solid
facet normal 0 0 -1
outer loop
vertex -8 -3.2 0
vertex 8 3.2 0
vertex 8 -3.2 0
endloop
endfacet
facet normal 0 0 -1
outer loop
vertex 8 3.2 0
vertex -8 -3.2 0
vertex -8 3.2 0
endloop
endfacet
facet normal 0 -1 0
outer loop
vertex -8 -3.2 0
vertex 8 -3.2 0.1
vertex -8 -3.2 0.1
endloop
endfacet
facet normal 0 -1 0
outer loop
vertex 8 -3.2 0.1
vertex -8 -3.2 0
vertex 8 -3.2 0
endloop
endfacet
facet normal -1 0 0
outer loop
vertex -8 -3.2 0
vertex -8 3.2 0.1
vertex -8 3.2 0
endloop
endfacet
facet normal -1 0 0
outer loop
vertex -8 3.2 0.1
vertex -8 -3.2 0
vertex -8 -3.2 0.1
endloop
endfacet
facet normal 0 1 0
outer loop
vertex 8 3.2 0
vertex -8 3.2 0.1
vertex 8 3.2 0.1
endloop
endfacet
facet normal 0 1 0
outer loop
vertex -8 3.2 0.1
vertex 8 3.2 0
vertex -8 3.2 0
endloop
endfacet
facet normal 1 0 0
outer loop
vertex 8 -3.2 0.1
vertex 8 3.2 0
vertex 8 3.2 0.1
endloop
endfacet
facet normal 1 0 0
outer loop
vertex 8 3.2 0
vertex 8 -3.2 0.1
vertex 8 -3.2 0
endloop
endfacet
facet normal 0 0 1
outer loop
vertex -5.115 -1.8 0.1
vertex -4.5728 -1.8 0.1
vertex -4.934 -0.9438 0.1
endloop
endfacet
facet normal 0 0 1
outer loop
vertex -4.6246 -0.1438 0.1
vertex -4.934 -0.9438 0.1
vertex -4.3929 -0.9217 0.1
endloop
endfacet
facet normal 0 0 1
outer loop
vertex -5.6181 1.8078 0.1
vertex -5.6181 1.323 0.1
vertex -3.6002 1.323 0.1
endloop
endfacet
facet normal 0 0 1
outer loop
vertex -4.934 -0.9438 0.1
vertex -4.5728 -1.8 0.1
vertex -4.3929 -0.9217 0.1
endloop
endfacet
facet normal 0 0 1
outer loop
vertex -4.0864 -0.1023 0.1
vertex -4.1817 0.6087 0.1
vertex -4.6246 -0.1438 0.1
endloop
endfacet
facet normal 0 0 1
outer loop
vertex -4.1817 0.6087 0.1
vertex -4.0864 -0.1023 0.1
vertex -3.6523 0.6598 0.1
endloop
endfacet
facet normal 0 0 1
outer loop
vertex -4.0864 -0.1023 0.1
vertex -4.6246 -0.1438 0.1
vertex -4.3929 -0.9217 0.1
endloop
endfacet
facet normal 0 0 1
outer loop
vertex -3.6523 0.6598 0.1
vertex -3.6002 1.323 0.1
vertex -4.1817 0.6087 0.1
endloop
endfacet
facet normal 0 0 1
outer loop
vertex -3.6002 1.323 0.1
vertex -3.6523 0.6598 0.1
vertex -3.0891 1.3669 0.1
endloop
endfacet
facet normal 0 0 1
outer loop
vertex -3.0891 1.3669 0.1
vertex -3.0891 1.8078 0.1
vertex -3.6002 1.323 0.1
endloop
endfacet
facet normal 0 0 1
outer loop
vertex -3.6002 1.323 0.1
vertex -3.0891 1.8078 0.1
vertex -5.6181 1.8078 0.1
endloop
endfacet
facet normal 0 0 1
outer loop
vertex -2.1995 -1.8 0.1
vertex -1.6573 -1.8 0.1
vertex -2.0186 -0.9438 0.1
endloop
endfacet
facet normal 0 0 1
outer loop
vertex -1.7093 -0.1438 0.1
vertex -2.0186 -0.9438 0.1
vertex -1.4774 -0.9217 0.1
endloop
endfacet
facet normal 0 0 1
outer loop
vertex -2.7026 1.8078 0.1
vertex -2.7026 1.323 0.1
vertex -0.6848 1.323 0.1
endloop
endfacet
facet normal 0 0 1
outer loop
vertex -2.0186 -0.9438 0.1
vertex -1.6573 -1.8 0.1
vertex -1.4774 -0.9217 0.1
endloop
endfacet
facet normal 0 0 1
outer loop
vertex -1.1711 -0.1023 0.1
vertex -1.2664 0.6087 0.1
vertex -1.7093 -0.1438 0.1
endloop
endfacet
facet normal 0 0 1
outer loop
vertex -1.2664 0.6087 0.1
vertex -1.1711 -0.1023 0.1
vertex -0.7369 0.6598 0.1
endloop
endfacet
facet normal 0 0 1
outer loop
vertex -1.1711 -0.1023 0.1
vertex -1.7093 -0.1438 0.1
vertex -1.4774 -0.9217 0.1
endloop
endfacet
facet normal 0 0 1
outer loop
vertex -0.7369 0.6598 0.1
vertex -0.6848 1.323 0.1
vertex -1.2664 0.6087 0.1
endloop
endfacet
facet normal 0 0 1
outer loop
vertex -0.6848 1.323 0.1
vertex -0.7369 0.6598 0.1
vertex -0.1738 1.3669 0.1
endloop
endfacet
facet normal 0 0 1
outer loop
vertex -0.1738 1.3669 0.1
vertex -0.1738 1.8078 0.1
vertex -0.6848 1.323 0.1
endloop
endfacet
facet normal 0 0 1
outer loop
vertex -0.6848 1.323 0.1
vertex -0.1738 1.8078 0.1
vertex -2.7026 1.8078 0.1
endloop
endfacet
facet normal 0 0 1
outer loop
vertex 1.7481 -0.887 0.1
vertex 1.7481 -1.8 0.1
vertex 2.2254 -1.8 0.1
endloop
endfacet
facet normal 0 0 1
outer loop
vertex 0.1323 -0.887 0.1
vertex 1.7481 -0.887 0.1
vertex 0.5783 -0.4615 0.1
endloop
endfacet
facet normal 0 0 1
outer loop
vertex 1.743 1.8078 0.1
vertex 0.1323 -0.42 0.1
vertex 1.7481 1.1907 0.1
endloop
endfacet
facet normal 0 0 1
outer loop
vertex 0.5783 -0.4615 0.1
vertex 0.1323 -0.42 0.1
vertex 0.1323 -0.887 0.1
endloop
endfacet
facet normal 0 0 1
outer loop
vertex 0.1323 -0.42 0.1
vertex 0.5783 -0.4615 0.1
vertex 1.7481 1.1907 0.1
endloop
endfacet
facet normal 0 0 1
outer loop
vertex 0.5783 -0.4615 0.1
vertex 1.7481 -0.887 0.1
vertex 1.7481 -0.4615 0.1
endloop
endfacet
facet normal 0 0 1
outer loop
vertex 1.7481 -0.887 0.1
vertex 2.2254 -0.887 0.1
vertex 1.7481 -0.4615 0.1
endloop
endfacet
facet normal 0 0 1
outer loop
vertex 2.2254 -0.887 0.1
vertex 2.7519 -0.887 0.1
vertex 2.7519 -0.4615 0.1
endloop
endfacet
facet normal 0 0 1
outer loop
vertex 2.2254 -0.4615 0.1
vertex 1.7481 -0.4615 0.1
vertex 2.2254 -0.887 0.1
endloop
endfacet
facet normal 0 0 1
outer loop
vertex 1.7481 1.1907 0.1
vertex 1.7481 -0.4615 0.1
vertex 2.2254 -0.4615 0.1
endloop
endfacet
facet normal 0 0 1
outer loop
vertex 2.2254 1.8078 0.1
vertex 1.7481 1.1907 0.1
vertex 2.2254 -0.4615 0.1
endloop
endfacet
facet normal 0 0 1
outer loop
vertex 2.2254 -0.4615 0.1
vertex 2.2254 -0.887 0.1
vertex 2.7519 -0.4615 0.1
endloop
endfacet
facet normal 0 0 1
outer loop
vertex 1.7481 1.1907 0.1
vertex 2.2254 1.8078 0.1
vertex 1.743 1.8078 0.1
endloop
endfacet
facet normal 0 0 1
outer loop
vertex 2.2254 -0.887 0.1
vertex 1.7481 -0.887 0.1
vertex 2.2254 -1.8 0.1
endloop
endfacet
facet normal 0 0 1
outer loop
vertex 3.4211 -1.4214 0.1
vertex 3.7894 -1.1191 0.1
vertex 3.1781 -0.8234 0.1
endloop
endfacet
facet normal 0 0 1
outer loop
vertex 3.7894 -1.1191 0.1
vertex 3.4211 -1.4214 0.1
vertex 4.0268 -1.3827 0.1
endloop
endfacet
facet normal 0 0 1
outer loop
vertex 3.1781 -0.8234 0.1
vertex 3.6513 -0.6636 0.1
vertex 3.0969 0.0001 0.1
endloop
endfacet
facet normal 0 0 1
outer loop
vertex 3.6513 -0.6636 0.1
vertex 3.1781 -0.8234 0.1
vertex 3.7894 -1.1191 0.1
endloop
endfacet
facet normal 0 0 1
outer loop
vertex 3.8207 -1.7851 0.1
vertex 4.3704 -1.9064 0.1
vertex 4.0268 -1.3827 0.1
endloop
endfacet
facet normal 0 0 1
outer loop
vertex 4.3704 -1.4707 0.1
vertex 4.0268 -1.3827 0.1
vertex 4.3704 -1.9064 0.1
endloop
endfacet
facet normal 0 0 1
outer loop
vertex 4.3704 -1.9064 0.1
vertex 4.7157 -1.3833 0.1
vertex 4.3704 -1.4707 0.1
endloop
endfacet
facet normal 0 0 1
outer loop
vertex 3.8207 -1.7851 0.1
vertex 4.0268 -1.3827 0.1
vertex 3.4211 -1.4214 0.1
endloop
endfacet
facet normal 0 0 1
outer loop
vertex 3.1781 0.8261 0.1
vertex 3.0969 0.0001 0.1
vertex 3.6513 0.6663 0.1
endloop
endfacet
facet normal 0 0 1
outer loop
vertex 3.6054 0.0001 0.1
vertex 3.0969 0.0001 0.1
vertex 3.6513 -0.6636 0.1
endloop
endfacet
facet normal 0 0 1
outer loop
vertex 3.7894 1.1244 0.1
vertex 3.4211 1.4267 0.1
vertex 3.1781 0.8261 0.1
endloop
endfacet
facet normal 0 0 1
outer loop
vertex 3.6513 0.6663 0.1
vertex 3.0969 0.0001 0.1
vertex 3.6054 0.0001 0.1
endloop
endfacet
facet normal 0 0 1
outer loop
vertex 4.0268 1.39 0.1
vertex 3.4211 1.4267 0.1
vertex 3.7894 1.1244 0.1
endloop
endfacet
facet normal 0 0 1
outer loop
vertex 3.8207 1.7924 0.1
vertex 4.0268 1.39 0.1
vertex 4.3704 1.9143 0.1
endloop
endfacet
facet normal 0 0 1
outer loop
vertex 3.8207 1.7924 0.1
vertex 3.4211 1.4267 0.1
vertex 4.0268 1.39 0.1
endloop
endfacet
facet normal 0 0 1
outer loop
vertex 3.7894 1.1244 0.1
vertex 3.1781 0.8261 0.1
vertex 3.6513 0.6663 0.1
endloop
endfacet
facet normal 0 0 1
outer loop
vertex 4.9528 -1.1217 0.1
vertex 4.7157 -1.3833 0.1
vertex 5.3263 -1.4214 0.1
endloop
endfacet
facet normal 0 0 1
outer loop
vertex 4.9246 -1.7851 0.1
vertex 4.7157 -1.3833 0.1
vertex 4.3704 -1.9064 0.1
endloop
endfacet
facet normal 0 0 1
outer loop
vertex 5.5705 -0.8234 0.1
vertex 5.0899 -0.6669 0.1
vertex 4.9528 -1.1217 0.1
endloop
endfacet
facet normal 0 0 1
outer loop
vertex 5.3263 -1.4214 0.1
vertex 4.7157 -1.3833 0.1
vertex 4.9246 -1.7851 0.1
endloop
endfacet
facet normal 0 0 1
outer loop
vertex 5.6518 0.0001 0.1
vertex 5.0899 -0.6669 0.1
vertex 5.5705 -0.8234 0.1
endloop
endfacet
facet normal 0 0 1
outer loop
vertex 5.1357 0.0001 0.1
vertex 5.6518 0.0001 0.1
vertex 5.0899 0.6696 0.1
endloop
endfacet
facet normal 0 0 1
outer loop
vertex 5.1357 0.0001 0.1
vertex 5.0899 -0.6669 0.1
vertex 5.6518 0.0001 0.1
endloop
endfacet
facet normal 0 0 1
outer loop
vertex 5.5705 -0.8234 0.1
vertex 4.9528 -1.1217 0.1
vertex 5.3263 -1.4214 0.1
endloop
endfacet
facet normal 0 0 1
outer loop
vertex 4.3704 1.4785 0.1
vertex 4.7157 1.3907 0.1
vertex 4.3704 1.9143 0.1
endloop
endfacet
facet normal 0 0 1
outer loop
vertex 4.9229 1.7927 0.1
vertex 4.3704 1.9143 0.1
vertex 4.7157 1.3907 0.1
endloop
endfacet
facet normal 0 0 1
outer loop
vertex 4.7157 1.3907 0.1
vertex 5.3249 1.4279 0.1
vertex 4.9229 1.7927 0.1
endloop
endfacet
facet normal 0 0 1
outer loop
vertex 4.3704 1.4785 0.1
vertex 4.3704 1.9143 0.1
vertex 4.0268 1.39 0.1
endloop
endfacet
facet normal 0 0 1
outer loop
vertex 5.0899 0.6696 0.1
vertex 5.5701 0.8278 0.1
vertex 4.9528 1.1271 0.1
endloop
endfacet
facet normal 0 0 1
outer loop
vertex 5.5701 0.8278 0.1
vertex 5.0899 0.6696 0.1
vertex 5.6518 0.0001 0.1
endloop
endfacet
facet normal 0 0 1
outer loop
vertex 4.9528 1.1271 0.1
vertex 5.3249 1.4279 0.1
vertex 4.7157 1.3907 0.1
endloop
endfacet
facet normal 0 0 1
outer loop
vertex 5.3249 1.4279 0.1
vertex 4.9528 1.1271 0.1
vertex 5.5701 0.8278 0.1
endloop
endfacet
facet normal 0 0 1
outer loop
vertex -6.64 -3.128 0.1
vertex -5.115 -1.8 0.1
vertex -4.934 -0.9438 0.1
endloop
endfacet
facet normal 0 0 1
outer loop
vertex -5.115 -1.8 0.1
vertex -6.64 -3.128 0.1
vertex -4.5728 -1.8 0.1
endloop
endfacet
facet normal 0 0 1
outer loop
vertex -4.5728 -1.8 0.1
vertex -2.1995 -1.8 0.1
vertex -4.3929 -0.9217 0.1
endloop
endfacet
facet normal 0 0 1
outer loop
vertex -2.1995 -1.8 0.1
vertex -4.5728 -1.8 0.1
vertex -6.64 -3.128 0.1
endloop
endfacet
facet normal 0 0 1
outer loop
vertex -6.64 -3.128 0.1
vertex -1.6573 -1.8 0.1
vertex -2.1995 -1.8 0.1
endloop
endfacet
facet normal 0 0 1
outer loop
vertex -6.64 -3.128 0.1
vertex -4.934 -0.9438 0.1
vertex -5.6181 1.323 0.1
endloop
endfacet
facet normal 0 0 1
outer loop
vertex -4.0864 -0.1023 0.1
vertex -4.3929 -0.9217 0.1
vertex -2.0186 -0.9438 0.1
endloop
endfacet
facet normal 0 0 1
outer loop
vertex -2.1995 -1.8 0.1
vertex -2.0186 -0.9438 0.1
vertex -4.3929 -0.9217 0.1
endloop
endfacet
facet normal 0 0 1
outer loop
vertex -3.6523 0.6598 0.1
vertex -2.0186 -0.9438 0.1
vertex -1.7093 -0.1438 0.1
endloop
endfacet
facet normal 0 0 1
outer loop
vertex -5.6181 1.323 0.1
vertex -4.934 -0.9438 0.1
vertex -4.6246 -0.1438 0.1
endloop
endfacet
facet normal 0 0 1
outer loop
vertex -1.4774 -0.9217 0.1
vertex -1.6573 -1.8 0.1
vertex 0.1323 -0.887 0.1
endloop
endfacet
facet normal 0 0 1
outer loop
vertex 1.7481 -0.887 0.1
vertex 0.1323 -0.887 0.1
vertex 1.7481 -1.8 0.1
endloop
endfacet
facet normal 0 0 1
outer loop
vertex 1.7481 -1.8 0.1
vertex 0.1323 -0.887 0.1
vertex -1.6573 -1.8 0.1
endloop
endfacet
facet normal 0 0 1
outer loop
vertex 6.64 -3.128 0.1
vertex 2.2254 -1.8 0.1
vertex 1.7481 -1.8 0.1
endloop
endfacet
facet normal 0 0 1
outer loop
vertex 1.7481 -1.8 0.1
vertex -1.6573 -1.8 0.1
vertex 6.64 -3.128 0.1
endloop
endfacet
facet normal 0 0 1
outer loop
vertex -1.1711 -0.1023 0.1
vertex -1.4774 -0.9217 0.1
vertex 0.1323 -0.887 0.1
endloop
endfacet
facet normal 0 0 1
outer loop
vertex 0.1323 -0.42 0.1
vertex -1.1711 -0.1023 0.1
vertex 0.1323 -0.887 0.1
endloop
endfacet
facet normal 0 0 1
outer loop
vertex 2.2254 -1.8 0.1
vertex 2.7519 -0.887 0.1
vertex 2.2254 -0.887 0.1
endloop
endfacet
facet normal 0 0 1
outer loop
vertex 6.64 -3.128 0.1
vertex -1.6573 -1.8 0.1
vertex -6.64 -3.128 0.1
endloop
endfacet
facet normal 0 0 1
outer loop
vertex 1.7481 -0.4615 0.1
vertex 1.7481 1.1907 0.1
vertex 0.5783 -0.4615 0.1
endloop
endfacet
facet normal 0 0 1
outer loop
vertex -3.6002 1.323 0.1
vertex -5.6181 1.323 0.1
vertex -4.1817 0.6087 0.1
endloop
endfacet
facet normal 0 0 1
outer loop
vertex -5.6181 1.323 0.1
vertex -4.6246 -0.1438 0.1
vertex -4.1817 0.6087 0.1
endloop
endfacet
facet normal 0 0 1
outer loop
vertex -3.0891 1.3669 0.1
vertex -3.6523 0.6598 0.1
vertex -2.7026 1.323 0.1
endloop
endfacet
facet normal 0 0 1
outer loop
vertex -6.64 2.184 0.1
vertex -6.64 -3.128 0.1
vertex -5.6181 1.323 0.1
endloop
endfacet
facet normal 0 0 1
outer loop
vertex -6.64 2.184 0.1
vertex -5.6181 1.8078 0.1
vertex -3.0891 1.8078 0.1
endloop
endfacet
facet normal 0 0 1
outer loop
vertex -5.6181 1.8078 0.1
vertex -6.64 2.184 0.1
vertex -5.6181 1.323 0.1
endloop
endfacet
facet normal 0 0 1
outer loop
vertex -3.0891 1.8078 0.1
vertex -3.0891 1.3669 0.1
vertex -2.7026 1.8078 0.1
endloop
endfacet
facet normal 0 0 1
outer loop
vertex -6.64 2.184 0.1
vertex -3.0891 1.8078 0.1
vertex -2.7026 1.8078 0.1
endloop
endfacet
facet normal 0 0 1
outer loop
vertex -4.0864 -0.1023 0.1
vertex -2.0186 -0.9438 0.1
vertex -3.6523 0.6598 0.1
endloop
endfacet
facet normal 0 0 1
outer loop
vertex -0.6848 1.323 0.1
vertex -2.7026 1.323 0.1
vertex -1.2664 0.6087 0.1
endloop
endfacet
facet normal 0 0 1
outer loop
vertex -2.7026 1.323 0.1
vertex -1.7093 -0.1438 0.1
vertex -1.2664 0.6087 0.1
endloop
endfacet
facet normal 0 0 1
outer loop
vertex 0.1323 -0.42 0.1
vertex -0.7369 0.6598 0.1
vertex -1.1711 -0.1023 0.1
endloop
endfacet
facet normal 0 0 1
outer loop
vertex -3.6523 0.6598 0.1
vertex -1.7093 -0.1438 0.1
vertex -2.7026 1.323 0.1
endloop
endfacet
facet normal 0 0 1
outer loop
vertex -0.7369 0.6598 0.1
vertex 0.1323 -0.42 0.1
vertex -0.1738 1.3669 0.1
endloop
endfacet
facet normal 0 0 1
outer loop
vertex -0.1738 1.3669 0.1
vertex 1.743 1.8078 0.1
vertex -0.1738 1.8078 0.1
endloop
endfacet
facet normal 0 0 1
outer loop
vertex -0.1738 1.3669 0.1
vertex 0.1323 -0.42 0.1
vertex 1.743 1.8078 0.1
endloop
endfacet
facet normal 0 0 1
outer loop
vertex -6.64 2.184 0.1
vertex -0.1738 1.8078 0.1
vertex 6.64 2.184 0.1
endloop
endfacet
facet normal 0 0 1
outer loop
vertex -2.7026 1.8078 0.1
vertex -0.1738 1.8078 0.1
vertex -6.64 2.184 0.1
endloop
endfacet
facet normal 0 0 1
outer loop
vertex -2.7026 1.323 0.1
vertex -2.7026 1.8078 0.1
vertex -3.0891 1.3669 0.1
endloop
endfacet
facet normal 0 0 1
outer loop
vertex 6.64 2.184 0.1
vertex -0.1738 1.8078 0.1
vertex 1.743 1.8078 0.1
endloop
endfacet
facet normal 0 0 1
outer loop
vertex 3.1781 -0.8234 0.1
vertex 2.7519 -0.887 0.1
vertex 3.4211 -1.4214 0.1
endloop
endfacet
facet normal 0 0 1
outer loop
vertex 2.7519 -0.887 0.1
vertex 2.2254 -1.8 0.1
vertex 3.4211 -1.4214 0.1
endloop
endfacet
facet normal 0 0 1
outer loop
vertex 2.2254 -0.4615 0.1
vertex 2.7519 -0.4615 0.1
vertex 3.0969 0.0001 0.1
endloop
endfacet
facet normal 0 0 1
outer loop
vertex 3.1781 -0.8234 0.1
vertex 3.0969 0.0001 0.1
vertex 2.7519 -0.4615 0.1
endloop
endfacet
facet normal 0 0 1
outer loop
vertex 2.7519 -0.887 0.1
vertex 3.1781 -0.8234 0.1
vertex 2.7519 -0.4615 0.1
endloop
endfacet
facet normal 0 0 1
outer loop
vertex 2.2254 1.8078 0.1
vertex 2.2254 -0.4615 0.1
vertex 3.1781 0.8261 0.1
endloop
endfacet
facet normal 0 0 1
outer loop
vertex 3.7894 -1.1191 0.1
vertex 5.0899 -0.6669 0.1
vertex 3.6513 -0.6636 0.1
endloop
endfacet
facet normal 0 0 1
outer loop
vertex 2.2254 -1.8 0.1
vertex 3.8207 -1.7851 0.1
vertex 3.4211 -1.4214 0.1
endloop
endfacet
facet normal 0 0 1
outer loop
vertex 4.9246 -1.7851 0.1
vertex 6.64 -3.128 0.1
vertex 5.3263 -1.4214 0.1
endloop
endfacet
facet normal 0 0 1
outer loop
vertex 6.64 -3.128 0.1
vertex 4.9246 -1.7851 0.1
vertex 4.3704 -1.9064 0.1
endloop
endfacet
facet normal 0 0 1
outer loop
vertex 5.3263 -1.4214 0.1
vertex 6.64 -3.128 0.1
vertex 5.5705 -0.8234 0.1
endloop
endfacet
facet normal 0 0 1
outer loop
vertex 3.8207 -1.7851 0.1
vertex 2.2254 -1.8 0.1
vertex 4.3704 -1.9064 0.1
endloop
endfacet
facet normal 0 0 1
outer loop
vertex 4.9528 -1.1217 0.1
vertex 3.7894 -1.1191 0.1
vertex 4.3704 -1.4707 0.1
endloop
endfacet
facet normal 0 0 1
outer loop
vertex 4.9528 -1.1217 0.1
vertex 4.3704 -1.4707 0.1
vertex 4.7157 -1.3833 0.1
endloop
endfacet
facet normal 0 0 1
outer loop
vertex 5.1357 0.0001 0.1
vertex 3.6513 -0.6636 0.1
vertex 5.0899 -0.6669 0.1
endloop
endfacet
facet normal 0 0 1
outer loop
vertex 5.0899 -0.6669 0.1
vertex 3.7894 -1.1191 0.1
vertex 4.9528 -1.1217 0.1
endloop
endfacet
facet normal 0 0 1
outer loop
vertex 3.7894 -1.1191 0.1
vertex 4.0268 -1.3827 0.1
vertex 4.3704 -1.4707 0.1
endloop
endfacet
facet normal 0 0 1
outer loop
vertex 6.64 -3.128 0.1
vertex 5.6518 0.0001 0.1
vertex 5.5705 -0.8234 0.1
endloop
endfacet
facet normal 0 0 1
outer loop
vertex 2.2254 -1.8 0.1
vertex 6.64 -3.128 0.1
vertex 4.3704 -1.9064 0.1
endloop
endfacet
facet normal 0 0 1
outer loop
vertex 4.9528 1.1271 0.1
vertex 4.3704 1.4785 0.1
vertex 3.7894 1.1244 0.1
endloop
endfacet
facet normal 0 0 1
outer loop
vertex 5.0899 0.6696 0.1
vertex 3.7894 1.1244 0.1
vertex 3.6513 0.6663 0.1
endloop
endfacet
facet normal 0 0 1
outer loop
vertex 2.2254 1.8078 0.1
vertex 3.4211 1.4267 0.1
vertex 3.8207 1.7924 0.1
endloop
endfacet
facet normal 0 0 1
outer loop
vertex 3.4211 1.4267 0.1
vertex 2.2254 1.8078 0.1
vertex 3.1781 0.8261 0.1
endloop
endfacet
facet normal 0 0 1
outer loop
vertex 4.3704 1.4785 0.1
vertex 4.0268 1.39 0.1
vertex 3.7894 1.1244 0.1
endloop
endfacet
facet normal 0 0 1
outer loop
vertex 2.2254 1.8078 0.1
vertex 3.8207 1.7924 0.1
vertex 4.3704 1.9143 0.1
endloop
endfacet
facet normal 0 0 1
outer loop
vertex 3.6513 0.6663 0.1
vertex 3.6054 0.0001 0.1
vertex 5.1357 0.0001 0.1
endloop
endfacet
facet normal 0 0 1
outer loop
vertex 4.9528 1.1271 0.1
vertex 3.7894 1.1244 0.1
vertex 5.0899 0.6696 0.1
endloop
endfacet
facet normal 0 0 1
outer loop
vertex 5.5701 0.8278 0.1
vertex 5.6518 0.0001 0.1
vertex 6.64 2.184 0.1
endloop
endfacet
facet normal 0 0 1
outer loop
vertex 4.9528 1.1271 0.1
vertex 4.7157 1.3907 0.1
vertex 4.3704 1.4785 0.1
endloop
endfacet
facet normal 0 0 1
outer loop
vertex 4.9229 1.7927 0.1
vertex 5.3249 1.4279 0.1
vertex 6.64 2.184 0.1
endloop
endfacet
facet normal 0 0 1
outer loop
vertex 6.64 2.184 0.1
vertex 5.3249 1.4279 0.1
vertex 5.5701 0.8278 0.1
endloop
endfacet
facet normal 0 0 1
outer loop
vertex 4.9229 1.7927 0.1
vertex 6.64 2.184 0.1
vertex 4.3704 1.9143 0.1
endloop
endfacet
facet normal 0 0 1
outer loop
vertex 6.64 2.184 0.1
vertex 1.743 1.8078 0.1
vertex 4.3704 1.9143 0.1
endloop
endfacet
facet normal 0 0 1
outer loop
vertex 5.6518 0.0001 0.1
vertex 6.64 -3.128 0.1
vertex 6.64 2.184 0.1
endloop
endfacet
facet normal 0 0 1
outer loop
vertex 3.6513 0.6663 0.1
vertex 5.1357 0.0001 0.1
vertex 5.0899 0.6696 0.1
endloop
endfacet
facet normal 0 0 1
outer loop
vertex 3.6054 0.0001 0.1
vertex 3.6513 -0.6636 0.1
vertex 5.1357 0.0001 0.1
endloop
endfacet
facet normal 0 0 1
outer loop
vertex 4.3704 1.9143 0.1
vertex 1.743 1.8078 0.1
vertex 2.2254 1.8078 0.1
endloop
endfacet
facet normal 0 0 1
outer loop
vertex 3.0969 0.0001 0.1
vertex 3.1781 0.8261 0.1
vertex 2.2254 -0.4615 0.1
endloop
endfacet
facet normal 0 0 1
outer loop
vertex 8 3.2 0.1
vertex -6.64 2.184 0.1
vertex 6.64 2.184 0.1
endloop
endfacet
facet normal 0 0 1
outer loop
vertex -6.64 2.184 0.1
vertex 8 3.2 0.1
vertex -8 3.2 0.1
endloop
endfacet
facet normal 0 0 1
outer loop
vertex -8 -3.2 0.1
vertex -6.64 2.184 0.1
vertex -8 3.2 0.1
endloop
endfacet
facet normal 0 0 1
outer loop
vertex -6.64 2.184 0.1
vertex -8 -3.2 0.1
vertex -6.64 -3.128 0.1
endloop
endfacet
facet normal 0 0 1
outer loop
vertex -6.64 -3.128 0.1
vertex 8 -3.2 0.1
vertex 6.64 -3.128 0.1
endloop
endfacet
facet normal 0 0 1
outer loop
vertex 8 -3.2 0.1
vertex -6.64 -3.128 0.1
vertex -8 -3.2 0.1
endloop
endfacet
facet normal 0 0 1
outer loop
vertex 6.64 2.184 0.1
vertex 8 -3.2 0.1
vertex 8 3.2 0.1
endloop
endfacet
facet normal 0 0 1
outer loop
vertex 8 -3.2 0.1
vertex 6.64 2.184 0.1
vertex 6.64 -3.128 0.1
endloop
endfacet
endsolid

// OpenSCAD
// file: ../p/4-4edge.scad
use <../lib.scad>
$fa=1; $fs=0.2;
function ldraw_lib__4_4edge(realsolid=false) = [
// 0 Circle 1.0
// 0 Name: 4-4edge.dat
// 0 Author: James Jessiman
// 0 !LDRAW_ORG Primitive UPDATE 2017-01
// 0 !LICENSE Licensed under CC BY 2.0 and CC BY 4.0 : see CAreadme.txt
// 
// 0 BFC CERTIFY CCW
  [0,"BFC","CERTIFY"],
  [0,"BFC","CCW"],
// 
// 0 !HISTORY 1998-12-15 [PTadmin] Official Update 1998-10
// 0 !HISTORY 2005-12-28 [PTadmin] Official Update 2005-01
// 0 !HISTORY 2007-06-24 [PTadmin] Header formatted for Contributor Agreement
// 0 !HISTORY 2008-07-01 [PTadmin] Official Update 2008-01
// 0 !HISTORY 2017-01-15 [Steffen] BFCed
// 0 !HISTORY 2017-12-30 [PTadmin] Official Update 2017-01
// 
// 
// 2 24 1 0 0 0.9239 0 0.3827
  [2,24,1,0,0,0.9239,0,0.3827],
// 2 24 0.9239 0 0.3827 0.7071 0 0.7071
  [2,24,0.9239,0,0.3827,0.7071,0,0.7071],
// 2 24 0.7071 0 0.7071 0.3827 0 0.9239
  [2,24,0.7071,0,0.7071,0.3827,0,0.9239],
// 2 24 0.3827 0 0.9239 0 0 1
  [2,24,0.3827,0,0.9239,0,0,1],
// 2 24 0 0 1 -0.3827 0 0.9239
  [2,24,0,0,1,-0.3827,0,0.9239],
// 2 24 -0.3827 0 0.9239 -0.7071 0 0.7071
  [2,24,-0.3827,0,0.9239,-0.7071,0,0.7071],
// 2 24 -0.7071 0 0.7071 -0.9239 0 0.3827
  [2,24,-0.7071,0,0.7071,-0.9239,0,0.3827],
// 2 24 -0.9239 0 0.3827 -1 0 -0
  [2,24,-0.9239,0,0.3827,-1,0,-0],
// 2 24 -1 0 -0 -0.9239 0 -0.3827
  [2,24,-1,0,-0,-0.9239,0,-0.3827],
// 2 24 -0.9239 0 -0.3827 -0.7071 0 -0.7071
  [2,24,-0.9239,0,-0.3827,-0.7071,0,-0.7071],
// 2 24 -0.7071 0 -0.7071 -0.3827 0 -0.9239
  [2,24,-0.7071,0,-0.7071,-0.3827,0,-0.9239],
// 2 24 -0.3827 0 -0.9239 0 0 -1
  [2,24,-0.3827,0,-0.9239,0,0,-1],
// 2 24 0 0 -1 0.3827 0 -0.9239
  [2,24,0,0,-1,0.3827,0,-0.9239],
// 2 24 0.3827 0 -0.9239 0.7071 0 -0.7071
  [2,24,0.3827,0,-0.9239,0.7071,0,-0.7071],
// 2 24 0.7071 0 -0.7071 0.9239 0 -0.3827
  [2,24,0.7071,0,-0.7071,0.9239,0,-0.3827],
// 2 24 0.9239 0 -0.3827 1 0 0
  [2,24,0.9239,0,-0.3827,1,0,0],
];
module ldraw_lib__4_4edge(step=0, col=false, unit=2/5, alt=false, line=0.2, solid=!$preview)
    makepoly(ldraw_lib__4_4edge(solid), step=step, col=col, unit=unit, alt=alt, line=line, solid=solid);
ldraw_lib__4_4edge(line=0.2);
// file: ../p/4-4disc.scad
use <../lib.scad>
$fa=1; $fs=0.2;
function ldraw_lib__4_4disc(realsolid=false) = [
// 0 Disc 1.0
// 0 Name: 4-4disc.dat
// 0 Author: James Jessiman
// 0 !LDRAW_ORG Primitive UPDATE 2002-02
// 0 !LICENSE Licensed under CC BY 2.0 and CC BY 4.0 : see CAreadme.txt
// 
// 0 BFC CERTIFY CCW
  [0,"BFC","CERTIFY"],
  [0,"BFC","CCW"],
// 
// 0 !HISTORY 1998-12-15 [PTadmin] Official Update 1998-10
// 0 !HISTORY 2002-03-23 [sbliss] Added BFC statement
// 0 !HISTORY 2002-04-25 [PTadmin] Official Update 2002-02
// 0 !HISTORY 2007-06-24 [PTadmin] Header formatted for Contributor Agreement
// 0 !HISTORY 2008-07-01 [PTadmin] Official Update 2008-01
// 
// 
// 3 16 0 0 0 1 0 0 0.9239 0 0.3827
  [3,16,0,0,0,1,0,0,0.9239,0,0.3827],
// 3 16 0 0 0 0.9239 0 0.3827 0.7071 0 0.7071
  [3,16,0,0,0,0.9239,0,0.3827,0.7071,0,0.7071],
// 3 16 0 0 0 0.7071 0 0.7071 0.3827 0 0.9239
  [3,16,0,0,0,0.7071,0,0.7071,0.3827,0,0.9239],
// 3 16 0 0 0 0.3827 0 0.9239 0 0 1
  [3,16,0,0,0,0.3827,0,0.9239,0,0,1],
// 3 16 0 0 0 0 0 1 -0.3827 0 0.9239
  [3,16,0,0,0,0,0,1,-0.3827,0,0.9239],
// 3 16 0 0 0 -0.3827 0 0.9239 -0.7071 0 0.7071
  [3,16,0,0,0,-0.3827,0,0.9239,-0.7071,0,0.7071],
// 3 16 0 0 0 -0.7071 0 0.7071 -0.9239 0 0.3827
  [3,16,0,0,0,-0.7071,0,0.7071,-0.9239,0,0.3827],
// 3 16 0 0 0 -0.9239 0 0.3827 -1 0 -0
  [3,16,0,0,0,-0.9239,0,0.3827,-1,0,-0],
// 3 16 0 0 0 -1 0 -0 -0.9239 0 -0.3827
  [3,16,0,0,0,-1,0,-0,-0.9239,0,-0.3827],
// 3 16 0 0 0 -0.9239 0 -0.3827 -0.7071 0 -0.7071
  [3,16,0,0,0,-0.9239,0,-0.3827,-0.7071,0,-0.7071],
// 3 16 0 0 0 -0.7071 0 -0.7071 -0.3827 0 -0.9239
  [3,16,0,0,0,-0.7071,0,-0.7071,-0.3827,0,-0.9239],
// 3 16 0 0 0 -0.3827 0 -0.9239 0 0 -1
  [3,16,0,0,0,-0.3827,0,-0.9239,0,0,-1],
// 3 16 0 0 0 0 0 -1 0.3827 0 -0.9239
  [3,16,0,0,0,0,0,-1,0.3827,0,-0.9239],
// 3 16 0 0 0 0.3827 0 -0.9239 0.7071 0 -0.7071
  [3,16,0,0,0,0.3827,0,-0.9239,0.7071,0,-0.7071],
// 3 16 0 0 0 0.7071 0 -0.7071 0.9239 0 -0.3827
  [3,16,0,0,0,0.7071,0,-0.7071,0.9239,0,-0.3827],
// 3 16 0 0 0 0.9239 0 -0.3827 1 0 0
  [3,16,0,0,0,0.9239,0,-0.3827,1,0,0],
// 0
];
module ldraw_lib__4_4disc(step=0, col=false, unit=2/5, alt=false, line=0.2, solid=!$preview)
    makepoly(ldraw_lib__4_4disc(solid), step=step, col=col, unit=unit, alt=alt, line=line, solid=solid);
ldraw_lib__4_4disc(line=0.2);
// file: ../p/4-4cyli.scad
use <../lib.scad>
$fa=1; $fs=0.2;
function ldraw_lib__4_4cyli(realsolid=false) = [
// 0 Cylinder 1.0
// 0 Name: 4-4cyli.dat
// 0 Author: James Jessiman
// 0 !LDRAW_ORG Primitive UPDATE 2005-01
// 0 !LICENSE Licensed under CC BY 2.0 and CC BY 4.0 : see CAreadme.txt
// 
// 0 BFC CERTIFY CCW
  [0,"BFC","CERTIFY"],
  [0,"BFC","CCW"],
// 
// 0 !HISTORY 1998-12-15 [PTadmin] Official Update 1998-10
// 0 !HISTORY 2002-03-23 [sbliss] Added BFC statement; merged headers from files in distributions LDraw 0.27 and Complete.
// 0 !HISTORY 2002-04-25 [PTadmin] Official Update 2002-02
// 0 !HISTORY 2004-12-14 [guyvivan] BFC CCW
// 0 !HISTORY 2005-12-28 [PTadmin] Official Update 2005-01
// 0 !HISTORY 2007-06-24 [PTadmin] Header formatted for Contributor Agreement
// 0 !HISTORY 2008-07-01 [PTadmin] Official Update 2008-01
// 
// 
// 4 16 1 1 0 0.9239 1 0.3827 0.9239 0 0.3827 1 0 0
  [4,16,1,1,0,0.9239,1,0.3827,0.9239,0,0.3827,1,0,0],
// 5 24 1 0 0 1 1 0 0.9239 0 0.3827 0.9239 0 -0.3827
  [5,24,1,0,0,1,1,0,0.9239,0,0.3827,0.9239,0,-0.3827],
// 4 16 0.9239 1 0.3827 0.7071 1 0.7071 0.7071 0 0.7071 0.9239 0 0.3827
  [4,16,0.9239,1,0.3827,0.7071,1,0.7071,0.7071,0,0.7071,0.9239,0,0.3827],
// 5 24 0.9239 0 0.3827 0.9239 1 0.3827 0.7071 0 0.7071 1 0 0
  [5,24,0.9239,0,0.3827,0.9239,1,0.3827,0.7071,0,0.7071,1,0,0],
// 4 16 0.7071 1 0.7071 0.3827 1 0.9239 0.3827 0 0.9239 0.7071 0 0.7071
  [4,16,0.7071,1,0.7071,0.3827,1,0.9239,0.3827,0,0.9239,0.7071,0,0.7071],
// 5 24 0.7071 0 0.7071 0.7071 1 0.7071 0.3827 0 0.9239 0.9239 0 0.3827
  [5,24,0.7071,0,0.7071,0.7071,1,0.7071,0.3827,0,0.9239,0.9239,0,0.3827],
// 4 16 0.3827 1 0.9239 0 1 1 0 0 1 0.3827 0 0.9239
  [4,16,0.3827,1,0.9239,0,1,1,0,0,1,0.3827,0,0.9239],
// 5 24 0.3827 0 0.9239 0.3827 1 0.9239 0 0 1 0.7071 0 0.7071
  [5,24,0.3827,0,0.9239,0.3827,1,0.9239,0,0,1,0.7071,0,0.7071],
// 4 16 0 1 1 -0.3827 1 0.9239 -0.3827 0 0.9239 0 0 1
  [4,16,0,1,1,-0.3827,1,0.9239,-0.3827,0,0.9239,0,0,1],
// 5 24 0 0 1 0 1 1 -0.3827 0 0.9239 0.3827 0 0.9239
  [5,24,0,0,1,0,1,1,-0.3827,0,0.9239,0.3827,0,0.9239],
// 4 16 -0.3827 1 0.9239 -0.7071 1 0.7071 -0.7071 0 0.7071 -0.3827 0 0.9239
  [4,16,-0.3827,1,0.9239,-0.7071,1,0.7071,-0.7071,0,0.7071,-0.3827,0,0.9239],
// 5 24 -0.3827 0 0.9239 -0.3827 1 0.9239 -0.7071 0 0.7071 0 0 1
  [5,24,-0.3827,0,0.9239,-0.3827,1,0.9239,-0.7071,0,0.7071,0,0,1],
// 4 16 -0.7071 1 0.7071 -0.9239 1 0.3827 -0.9239 0 0.3827 -0.7071 0 0.7071
  [4,16,-0.7071,1,0.7071,-0.9239,1,0.3827,-0.9239,0,0.3827,-0.7071,0,0.7071],
// 5 24 -0.7071 0 0.7071 -0.7071 1 0.7071 -0.9239 0 0.3827 -0.3827 0 0.9239
  [5,24,-0.7071,0,0.7071,-0.7071,1,0.7071,-0.9239,0,0.3827,-0.3827,0,0.9239],
// 4 16 -0.9239 1 0.3827 -1 1 0 -1 0 0 -0.9239 0 0.3827
  [4,16,-0.9239,1,0.3827,-1,1,0,-1,0,0,-0.9239,0,0.3827],
// 5 24 -0.9239 0 0.3827 -0.9239 1 0.3827 -1 0 0 -0.7071 0 0.7071
  [5,24,-0.9239,0,0.3827,-0.9239,1,0.3827,-1,0,0,-0.7071,0,0.7071],
// 4 16 -1 1 0 -0.9239 1 -0.3827 -0.9239 0 -0.3827 -1 0 0
  [4,16,-1,1,0,-0.9239,1,-0.3827,-0.9239,0,-0.3827,-1,0,0],
// 5 24 -1 0 0 -1 1 0 -0.9239 0 -0.3827 -0.9239 0 0.3827
  [5,24,-1,0,0,-1,1,0,-0.9239,0,-0.3827,-0.9239,0,0.3827],
// 4 16 -0.9239 1 -0.3827 -0.7071 1 -0.7071 -0.7071 0 -0.7071 -0.9239 0 -0.3827
  [4,16,-0.9239,1,-0.3827,-0.7071,1,-0.7071,-0.7071,0,-0.7071,-0.9239,0,-0.3827],
// 5 24 -0.9239 0 -0.3827 -0.9239 1 -0.3827 -0.7071 0 -0.7071 -1 0 0
  [5,24,-0.9239,0,-0.3827,-0.9239,1,-0.3827,-0.7071,0,-0.7071,-1,0,0],
// 4 16 -0.7071 1 -0.7071 -0.3827 1 -0.9239 -0.3827 0 -0.9239 -0.7071 0 -0.7071
  [4,16,-0.7071,1,-0.7071,-0.3827,1,-0.9239,-0.3827,0,-0.9239,-0.7071,0,-0.7071],
// 5 24 -0.7071 0 -0.7071 -0.7071 1 -0.7071 -0.3827 0 -0.9239 -0.9239 0 -0.3827
  [5,24,-0.7071,0,-0.7071,-0.7071,1,-0.7071,-0.3827,0,-0.9239,-0.9239,0,-0.3827],
// 4 16 -0.3827 1 -0.9239 0 1 -1 0 0 -1 -0.3827 0 -0.9239
  [4,16,-0.3827,1,-0.9239,0,1,-1,0,0,-1,-0.3827,0,-0.9239],
// 5 24 -0.3827 0 -0.9239 -0.3827 1 -0.9239 0 0 -1 -0.7071 0 -0.7071
  [5,24,-0.3827,0,-0.9239,-0.3827,1,-0.9239,0,0,-1,-0.7071,0,-0.7071],
// 4 16 0 1 -1 0.3827 1 -0.9239 0.3827 0 -0.9239 0 0 -1
  [4,16,0,1,-1,0.3827,1,-0.9239,0.3827,0,-0.9239,0,0,-1],
// 5 24 0 0 -1 0 1 -1 0.3827 0 -0.9239 -0.3827 0 -0.9239
  [5,24,0,0,-1,0,1,-1,0.3827,0,-0.9239,-0.3827,0,-0.9239],
// 4 16 0.3827 1 -0.9239 0.7071 1 -0.7071 0.7071 0 -0.7071 0.3827 0 -0.9239
  [4,16,0.3827,1,-0.9239,0.7071,1,-0.7071,0.7071,0,-0.7071,0.3827,0,-0.9239],
// 5 24 0.3827 0 -0.9239 0.3827 1 -0.9239 0.7071 0 -0.7071 0 0 -1
  [5,24,0.3827,0,-0.9239,0.3827,1,-0.9239,0.7071,0,-0.7071,0,0,-1],
// 4 16 0.7071 1 -0.7071 0.9239 1 -0.3827 0.9239 0 -0.3827 0.7071 0 -0.7071
  [4,16,0.7071,1,-0.7071,0.9239,1,-0.3827,0.9239,0,-0.3827,0.7071,0,-0.7071],
// 5 24 0.7071 0 -0.7071 0.7071 1 -0.7071 0.9239 0 -0.3827 0.3827 0 -0.9239
  [5,24,0.7071,0,-0.7071,0.7071,1,-0.7071,0.9239,0,-0.3827,0.3827,0,-0.9239],
// 4 16 0.9239 1 -0.3827 1 1 0 1 0 0 0.9239 0 -0.3827
  [4,16,0.9239,1,-0.3827,1,1,0,1,0,0,0.9239,0,-0.3827],
// 5 24 0.9239 0 -0.3827 0.9239 1 -0.3827 1 0 0 0.7071 0 -0.7071
  [5,24,0.9239,0,-0.3827,0.9239,1,-0.3827,1,0,0,0.7071,0,-0.7071],
// 0
];
module ldraw_lib__4_4cyli(step=0, col=false, unit=2/5, alt=false, line=0.2, solid=!$preview)
    makepoly(ldraw_lib__4_4cyli(solid), step=step, col=col, unit=unit, alt=alt, line=line, solid=solid);
ldraw_lib__4_4cyli(line=0.2);
// file: ../p/stud3.scad
use <../lib.scad>
use <4-4cyli.scad>
use <4-4disc.scad>
use <4-4edge.scad>
$fa=1; $fs=0.2;
function ldraw_lib__stud3(realsolid=false) = realsolid ? 
    [openscad(translate([0,0,-eps()], o=cylinder(4+eps(), r=4)),2)] : [
// 0 Stud Tube Solid
// 0 Name: stud3.dat
// 0 Author: James Jessiman
// 0 !LDRAW_ORG Primitive UPDATE 2012-01
// 0 !LICENSE Licensed under CC BY 2.0 and CC BY 4.0 : see CAreadme.txt
// 
// 0 BFC CERTIFY CCW
  [0,"BFC","CERTIFY"],
  [0,"BFC","CCW"],
// 
// 0 !HISTORY 2002-04-04 [sbliss] Modified for BFC compliance
// 0 !HISTORY 2002-04-25 [PTadmin] Official Update 2002-02
// 0 !HISTORY 2007-06-24 [PTadmin] Header formatted for Contributor Agreement
// 0 !HISTORY 2008-07-01 [PTadmin] Official Update 2008-01
// 0 !HISTORY 2012-02-16 [Philo] Changed to CCW
// 0 !HISTORY 2012-03-30 [PTadmin] Official Update 2012-01
// 
// 
// 1 16 0 -4 0 4 0 0 0 1 0 0 0 4 4-4edge.dat
  [1,16,0,-4,0,4,0,0,0,1,0,0,0,4, ldraw_lib__4_4edge(realsolid)],
// 1 16 0 0 0 4 0 0 0 1 0 0 0 4 4-4edge.dat
  [1,16,0,0,0,4,0,0,0,1,0,0,0,4, ldraw_lib__4_4edge(realsolid)],
// 1 16 0 -4 0 4 0 0 0 1 0 0 0 4 4-4disc.dat
  [1,16,0,-4,0,4,0,0,0,1,0,0,0,4, ldraw_lib__4_4disc(realsolid)],
// 1 16 0 -4 0 4 0 0 0 4 0 0 0 4 4-4cyli.dat
  [1,16,0,-4,0,4,0,0,0,4,0,0,0,4, ldraw_lib__4_4cyli(realsolid)],
];
module ldraw_lib__stud3(step=0, col=false, unit=2/5, alt=false, line=0.2, solid=!$preview)
    makepoly(ldraw_lib__stud3(solid), step=step, col=col, unit=unit, alt=alt, line=line, solid=solid);
ldraw_lib__stud3(line=0.2);
// file: ../p/stud.scad
use <../lib.scad>
use <4-4cyli.scad>
use <4-4disc.scad>
use <4-4edge.scad>
$fa=1; $fs=0.2;
function ldraw_lib__stud(realsolid=false) = realsolid ? 
    [openscad(translate([0,0,-eps()], o=cylinder(4+eps(), r=6)),2)] : [
// 0 Stud
// 0 Name: stud.dat
// 0 Author: James Jessiman
// 0 !LDRAW_ORG Primitive UPDATE 2012-01
// 0 !LICENSE Licensed under CC BY 2.0 and CC BY 4.0 : see CAreadme.txt
// 
// 0 BFC CERTIFY CCW
  [0,"BFC","CERTIFY"],
  [0,"BFC","CCW"],
// 
// 0 !HISTORY 2002-04-04 [sbliss] Modified for BFC compliance
// 0 !HISTORY 2002-04-25 [PTadmin] Official Update 2002-02
// 0 !HISTORY 2007-06-24 [PTadmin] Header formatted for Contributor Agreement
// 0 !HISTORY 2008-07-01 [PTadmin] Official Update 2008-01
// 0 !HISTORY 2012-02-16 [Philo] Changed to CCW
// 0 !HISTORY 2012-03-30 [PTadmin] Official Update 2012-01
// 
// 
// 1 16 0 0 0 6 0 0 0 1 0 0 0 6 4-4edge.dat
  [1,16,0,0,0,6,0,0,0,1,0,0,0,6, ldraw_lib__4_4edge(realsolid)],
// 1 16 0 -4 0 6 0 0 0 1 0 0 0 6 4-4edge.dat
  [1,16,0,-4,0,6,0,0,0,1,0,0,0,6, ldraw_lib__4_4edge(realsolid)],
// 1 16 0 0 0 6 0 0 0 -4 0 0 0 6 4-4cyli.dat
  [1,16,0,0,0,6,0,0,0,-4,0,0,0,6, ldraw_lib__4_4cyli(realsolid)],
// 1 16 0 -4 0 6 0 0 0 1 0 0 0 6 4-4disc.dat
  [1,16,0,-4,0,6,0,0,0,1,0,0,0,6, ldraw_lib__4_4disc(realsolid)],
];
module ldraw_lib__stud(step=0, col=false, unit=2/5, alt=false, line=0.2, solid=!$preview)
    makepoly(ldraw_lib__stud(solid), step=step, col=col, unit=unit, alt=alt, line=line, solid=solid);
ldraw_lib__stud(line=0.2);
// file: ../p/box5.scad
use <../lib.scad>
$fa=1; $fs=0.2;
function ldraw_lib__box5(realsolid=false) = [
// 0 Box with 5 Faces and All Edges
// 0 Name: box5.dat
// 0 Author: James Jessiman
// 0 !LDRAW_ORG Primitive UPDATE 2012-01
// 0 !LICENSE Licensed under CC BY 2.0 and CC BY 4.0 : see CAreadme.txt
// 
// 0 BFC CERTIFY CCW
  [0,"BFC","CERTIFY"],
  [0,"BFC","CCW"],
// 
// 0 !HISTORY 2002-04-03 [sbliss] Modified for BFC compliance
// 0 !HISTORY 2002-04-25 [PTadmin] Official Update 2002-02
// 0 !HISTORY 2007-06-24 [PTadmin] Header formatted for Contributor Agreement
// 0 !HISTORY 2008-07-01 [PTadmin] Official Update 2008-01
// 0 !HISTORY 2012-02-16 [Philo] Changed to CCW
// 0 !HISTORY 2012-03-30 [PTadmin] Official Update 2012-01
// 
// 
// 2 24 1 1 1 -1 1 1
  [2,24,1,1,1,-1,1,1],
// 2 24 -1 1 1 -1 1 -1
  [2,24,-1,1,1,-1,1,-1],
// 2 24 -1 1 -1 1 1 -1
  [2,24,-1,1,-1,1,1,-1],
// 2 24 1 1 -1 1 1 1
  [2,24,1,1,-1,1,1,1],
// 2 24 1 0 1 -1 0 1
  [2,24,1,0,1,-1,0,1],
// 2 24 -1 0 1 -1 0 -1
  [2,24,-1,0,1,-1,0,-1],
// 2 24 -1 0 -1 1 0 -1
  [2,24,-1,0,-1,1,0,-1],
// 2 24 1 0 -1 1 0 1
  [2,24,1,0,-1,1,0,1],
// 2 24 1 0 1 1 1 1
  [2,24,1,0,1,1,1,1],
// 2 24 -1 0 1 -1 1 1
  [2,24,-1,0,1,-1,1,1],
// 2 24 1 0 -1 1 1 -1
  [2,24,1,0,-1,1,1,-1],
// 2 24 -1 0 -1 -1 1 -1
  [2,24,-1,0,-1,-1,1,-1],
// 4 16 -1 1 1 1 1 1 1 1 -1 -1 1 -1
  [4,16,-1,1,1,1,1,1,1,1,-1,-1,1,-1],
// 4 16 -1 1 1 -1 0 1 1 0 1 1 1 1
  [4,16,-1,1,1,-1,0,1,1,0,1,1,1,1],
// 4 16 -1 1 -1 -1 0 -1 -1 0 1 -1 1 1
  [4,16,-1,1,-1,-1,0,-1,-1,0,1,-1,1,1],
// 4 16 1 1 -1 1 0 -1 -1 0 -1 -1 1 -1
  [4,16,1,1,-1,1,0,-1,-1,0,-1,-1,1,-1],
// 4 16 1 1 1 1 0 1 1 0 -1 1 1 -1
  [4,16,1,1,1,1,0,1,1,0,-1,1,1,-1],
];
module ldraw_lib__box5(step=0, col=false, unit=2/5, alt=false, line=0.2, solid=!$preview)
    makepoly(ldraw_lib__box5(solid), step=step, col=col, unit=unit, alt=alt, line=line, solid=solid);
ldraw_lib__box5(line=0.2);
// file: ../p/box4t.scad
use <../lib.scad>
$fa=1; $fs=0.2;
function ldraw_lib__box4t(realsolid=false) = [
// 0 Box with 4 Adjacent Faces and All Edges
// 0 Name: box4t.dat
// 0 Author: Tore Eriksson [Tore_Eriksson]
// 0 !LDRAW_ORG Primitive UPDATE 2003-02
// 0 !LICENSE Licensed under CC BY 2.0 and CC BY 4.0 : see CAreadme.txt
// 
// 0 BFC CERTIFY CCW
  [0,"BFC","CERTIFY"],
  [0,"BFC","CCW"],
// 
// 0 !HISTORY 1997-09-29 [PTadmin] Official Update 1997-15
// 0 !HISTORY 2002-08-31 [izanette] Modified with WINDZ for BFC compliance
// 0 !HISTORY 2003-08-01 [PTadmin] Official Update 2003-02
// 0 !HISTORY 2007-06-24 [PTadmin] Header formatted for Contributor Agreement
// 0 !HISTORY 2008-07-01 [PTadmin] Official Update 2008-01
// 
// 
// 2 24 1 1 1 -1 1 1
  [2,24,1,1,1,-1,1,1],
// 2 24 -1 1 1 -1 1 -1
  [2,24,-1,1,1,-1,1,-1],
// 2 24 -1 1 -1 1 1 -1
  [2,24,-1,1,-1,1,1,-1],
// 2 24 1 1 -1 1 1 1
  [2,24,1,1,-1,1,1,1],
// 2 24 1 0 1 -1 0 1
  [2,24,1,0,1,-1,0,1],
// 2 24 -1 0 1 -1 0 -1
  [2,24,-1,0,1,-1,0,-1],
// 2 24 -1 0 -1 1 0 -1
  [2,24,-1,0,-1,1,0,-1],
// 2 24 1 0 -1 1 0 1
  [2,24,1,0,-1,1,0,1],
// 2 24 1 0 1 1 1 1
  [2,24,1,0,1,1,1,1],
// 2 24 -1 0 1 -1 1 1
  [2,24,-1,0,1,-1,1,1],
// 2 24 1 0 -1 1 1 -1
  [2,24,1,0,-1,1,1,-1],
// 2 24 -1 0 -1 -1 1 -1
  [2,24,-1,0,-1,-1,1,-1],
// 4 16 1 1 1 1 1 -1 -1 1 -1 -1 1 1
  [4,16,1,1,1,1,1,-1,-1,1,-1,-1,1,1],
// 4 16 1 1 1 -1 1 1 -1 0 1 1 0 1
  [4,16,1,1,1,-1,1,1,-1,0,1,1,0,1],
// 4 16 -1 1 1 -1 1 -1 -1 0 -1 -1 0 1
  [4,16,-1,1,1,-1,1,-1,-1,0,-1,-1,0,1],
// 0 4 16 -1 1 -1 -1 0 -1 1 0 -1 1 1 -1
// 4 16 1 1 -1 1 1 1 1 0 1 1 0 -1
  [4,16,1,1,-1,1,1,1,1,0,1,1,0,-1],
// 0
];
module ldraw_lib__box4t(step=0, col=false, unit=2/5, alt=false, line=0.2, solid=!$preview)
    makepoly(ldraw_lib__box4t(solid), step=step, col=col, unit=unit, alt=alt, line=line, solid=solid);
ldraw_lib__box4t(line=0.2);
// file: s/3004s01.scad
use <../../lib.scad>
use <../../p/box4t.scad>
use <../../p/box5.scad>
use <../../p/stud.scad>
use <../../p/stud3.scad>
$fa=1; $fs=0.2;
function ldraw_lib__s__3004s01(realsolid=false) = [
// 0 ~Brick  1 x  2 without Front Face
// 0 Name: s\3004s01.dat
// 0 Author: James Jessiman
// 0 !LDRAW_ORG Subpart UPDATE 2003-03
// 0 !LICENSE Licensed under CC BY 2.0 and CC BY 4.0 : see CAreadme.txt
// 
// 0 BFC CERTIFY CCW
  [0,"BFC","CERTIFY"],
  [0,"BFC","CCW"],
// 
// 0 !HISTORY 2003-09-07 [jriley] Subfiling, BFC
// 0 !HISTORY 2003-12-19 [PTadmin] Official Update 2003-03
// 0 !HISTORY 2007-08-29 [PTadmin] Header formatted for Contributor Agreement
// 0 !HISTORY 2008-07-01 [PTadmin] Official Update 2008-01
// 
// 
// 1 16 0 4 0 1 0 0 0 -5 0 0 0 1 stud3.dat
  [1,16,0,4,0,1,0,0,0,-5,0,0,0,1, ldraw_lib__stud3(realsolid)],
// 0 BFC INVERTNEXT
  [0,"BFC","INVERTNEXT"],
// 1 16 0 24 0 16 0 0 0 -20 0 0 0 6 box5.dat
  [1,16,0,24,0,16,0,0,0,-20,0,0,0,6, ldraw_lib__box5(realsolid)],
// 4 16 20 24 10 16 24 6 -16 24 6 -20 24 10
  [4,16,20,24,10,16,24,6,-16,24,6,-20,24,10],
// 4 16 -20 24 10 -16 24 6 -16 24 -6 -20 24 -10
  [4,16,-20,24,10,-16,24,6,-16,24,-6,-20,24,-10],
// 4 16 -20 24 -10 -16 24 -6 16 24 -6 20 24 -10
  [4,16,-20,24,-10,-16,24,-6,16,24,-6,20,24,-10],
// 4 16 20 24 -10 16 24 -6 16 24 6 20 24 10
  [4,16,20,24,-10,16,24,-6,16,24,6,20,24,10],
// 1 16 0 24 0 20 0 0 0 -24 0 0 0 10 box4t.dat
  [1,16,0,24,0,20,0,0,0,-24,0,0,0,10, ldraw_lib__box4t(realsolid)],
// 1 16 10 0 0 1 0 0 0 1 0 0 0 1 stud.dat
  [1,16,10,0,0,1,0,0,0,1,0,0,0,1, ldraw_lib__stud(realsolid)],
// 1 16 -10 0 0 1 0 0 0 1 0 0 0 1 stud.dat
  [1,16,-10,0,0,1,0,0,0,1,0,0,0,1, ldraw_lib__stud(realsolid)],
// 0
];
module ldraw_lib__s__3004s01(step=0, col=false, unit=2/5, alt=false, line=0.2, solid=!$preview)
    makepoly(ldraw_lib__s__3004s01(solid), step=step, col=col, unit=unit, alt=alt, line=line, solid=solid);
ldraw_lib__s__3004s01(line=0.2);
// file: 3004.scad
use <../lib.scad>
use <s/3004s01.scad>
$fa=1; $fs=0.2;
function ldraw_lib__3004(realsolid=false) = [
// 0 Brick  1 x  2
// 0 Name: 3004.dat
// 0 Author: James Jessiman
// 0 !LDRAW_ORG Part UPDATE 2022-05
// 0 !LICENSE Licensed under CC BY 2.0 and CC BY 4.0 : see CAreadme.txt
// 
// 0 BFC CERTIFY CCW
  [0,"BFC","CERTIFY"],
  [0,"BFC","CCW"],
// 
// 0 !HISTORY 2001-10-26 [PTadmin] Official Update 2001-01
// 0 !HISTORY 2002-05-07 {unknown} BFC Certification
// 0 !HISTORY 2002-06-11 [PTadmin] Official Update 2002-03
// 0 !HISTORY 2007-05-07 [PTadmin] Header formatted for Contributor Agreement
// 0 !HISTORY 2008-07-01 [PTadmin] Official Update 2008-01
// 0 !HISTORY 2022-08-04 [MagFors] Using subfile
// 0 !HISTORY 2022-09-15 [PTadmin] Official Update 2022-05
// 
// 
// 1 16 0 0 0 1 0 0 0 1 0 0 0 1 s\3004s01.dat
  [1,16,0,0,0,1,0,0,0,1,0,0,0,1, ldraw_lib__s__3004s01(realsolid)],
// 4 16 -20 24 -10 20 24 -10 20 0 -10 -20 0 -10
  [4,16,-20,24,-10,20,24,-10,20,0,-10,-20,0,-10],
];
module ldraw_lib__3004(step=0, col=false, unit=2/5, alt=false, line=0.2, solid=!$preview)
    makepoly(ldraw_lib__3004(solid), step=step, col=col, unit=unit, alt=alt, line=line, solid=solid);
ldraw_lib__3004(line=0.2);
// file: ../p/box5-12.scad
use <../lib.scad>
$fa=1; $fs=0.2;
function ldraw_lib__box5_12(realsolid=false) = [
// 0 Box with 5 Faces without Any Edges
// 0 Name: box5-12.dat
// 0 Author: Chris Dee [cwdee]
// 0 !LDRAW_ORG Primitive UPDATE 2009-02
// 0 !LICENSE Licensed under CC BY 2.0 and CC BY 4.0 : see CAreadme.txt
// 
// 0 BFC CERTIFY CCW
  [0,"BFC","CERTIFY"],
  [0,"BFC","CCW"],
// 
// 0 !HISTORY 2009-09-03 [PTadmin] Official Update 2009-02
// 
// 
// 4 16 1 1 1 1 1 -1 -1 1 -1 -1 1 1
  [4,16,1,1,1,1,1,-1,-1,1,-1,-1,1,1],
// 4 16 -1 0 1 1 0 1 1 1 1 -1 1 1
  [4,16,-1,0,1,1,0,1,1,1,1,-1,1,1],
// 4 16 -1 0 -1 -1 0 1 -1 1 1 -1 1 -1
  [4,16,-1,0,-1,-1,0,1,-1,1,1,-1,1,-1],
// 4 16 1 0 -1 -1 0 -1 -1 1 -1 1 1 -1
  [4,16,1,0,-1,-1,0,-1,-1,1,-1,1,1,-1],
// 4 16 1 0 1 1 0 -1 1 1 -1 1 1 1
  [4,16,1,0,1,1,0,-1,1,1,-1,1,1,1],
// 0
];
module ldraw_lib__box5_12(step=0, col=false, unit=2/5, alt=false, line=0.2, solid=!$preview)
    makepoly(ldraw_lib__box5_12(solid), step=step, col=col, unit=unit, alt=alt, line=line, solid=solid);
ldraw_lib__box5_12(line=0.2);
// main file
use <../lib.scad>
use <../p/box5-12.scad>
use <s/191915s01.scad>
$fa=1; $fs=0.2;
function ldraw_lib__191915b(realsolid=false) = [
// 0 Sticker  0.8 x  2 with White "7740"
// 0 Name: 191915b.dat
// 0 Author: Steffen [Steffen]
// 0 !LDRAW_ORG Part UPDATE 2012-01
// 0 !LICENSE Licensed under CC BY 2.0 and CC BY 4.0 : see CAreadme.txt
// 
// 0 BFC CERTIFY CCW
  [0,"BFC","CERTIFY"],
  [0,"BFC","CCW"],
// 
// 0 !KEYWORDS set 7740
// 
// 0 !HISTORY 2012-03-30 [PTadmin] Official Update 2012-01
// 
// 
// 1 16 0 -0.25 0 20 0 0 0 0.25 0 0 0 -8 box5-12.dat
  [1,16,0,-0.25,0,20,0,0,0,0.25,0,0,0,-8, ldraw_lib__box5_12(realsolid)],
// 1 16 0 -0.25 -4.5 0.415 0 0 0 1 0 0 0 0.415 s\191915s01.dat
  [1,16,0,-0.25,-4.5,0.415,0,0,0,1,0,0,0,0.415, ldraw_lib__s__191915s01(realsolid)],
// 4 16 -20 -0.25 8 -16.6 -0.25 5.46 16.6 -0.25 5.46 20 -0.25 8
  [4,16,-20,-0.25,8,-16.6,-0.25,5.46,16.6,-0.25,5.46,20,-0.25,8],
// 4 16 -16.6 -0.25 5.46 -20 -0.25 8 -20 -0.25 -8 -16.6 -0.25 -7.82
  [4,16,-16.6,-0.25,5.46,-20,-0.25,8,-20,-0.25,-8,-16.6,-0.25,-7.82],
// 4 16 -16.6 -0.25 -7.82 -20 -0.25 -8 20 -0.25 -8 16.6 -0.25 -7.82
  [4,16,-16.6,-0.25,-7.82,-20,-0.25,-8,20,-0.25,-8,16.6,-0.25,-7.82],
// 4 16 20 -0.25 8 16.6 -0.25 5.46 16.6 -0.25 -7.82 20 -0.25 -8
  [4,16,20,-0.25,8,16.6,-0.25,5.46,16.6,-0.25,-7.82,20,-0.25,-8],
// 0
];
module ldraw_lib__191915b(step=0, col=false, unit=2/5, alt=false, line=0.2, solid=!$preview)
    makepoly(ldraw_lib__191915b(solid), step=step, col=col, unit=unit, alt=alt, line=line, solid=solid);
ldraw_lib__191915b(line=0.2);
